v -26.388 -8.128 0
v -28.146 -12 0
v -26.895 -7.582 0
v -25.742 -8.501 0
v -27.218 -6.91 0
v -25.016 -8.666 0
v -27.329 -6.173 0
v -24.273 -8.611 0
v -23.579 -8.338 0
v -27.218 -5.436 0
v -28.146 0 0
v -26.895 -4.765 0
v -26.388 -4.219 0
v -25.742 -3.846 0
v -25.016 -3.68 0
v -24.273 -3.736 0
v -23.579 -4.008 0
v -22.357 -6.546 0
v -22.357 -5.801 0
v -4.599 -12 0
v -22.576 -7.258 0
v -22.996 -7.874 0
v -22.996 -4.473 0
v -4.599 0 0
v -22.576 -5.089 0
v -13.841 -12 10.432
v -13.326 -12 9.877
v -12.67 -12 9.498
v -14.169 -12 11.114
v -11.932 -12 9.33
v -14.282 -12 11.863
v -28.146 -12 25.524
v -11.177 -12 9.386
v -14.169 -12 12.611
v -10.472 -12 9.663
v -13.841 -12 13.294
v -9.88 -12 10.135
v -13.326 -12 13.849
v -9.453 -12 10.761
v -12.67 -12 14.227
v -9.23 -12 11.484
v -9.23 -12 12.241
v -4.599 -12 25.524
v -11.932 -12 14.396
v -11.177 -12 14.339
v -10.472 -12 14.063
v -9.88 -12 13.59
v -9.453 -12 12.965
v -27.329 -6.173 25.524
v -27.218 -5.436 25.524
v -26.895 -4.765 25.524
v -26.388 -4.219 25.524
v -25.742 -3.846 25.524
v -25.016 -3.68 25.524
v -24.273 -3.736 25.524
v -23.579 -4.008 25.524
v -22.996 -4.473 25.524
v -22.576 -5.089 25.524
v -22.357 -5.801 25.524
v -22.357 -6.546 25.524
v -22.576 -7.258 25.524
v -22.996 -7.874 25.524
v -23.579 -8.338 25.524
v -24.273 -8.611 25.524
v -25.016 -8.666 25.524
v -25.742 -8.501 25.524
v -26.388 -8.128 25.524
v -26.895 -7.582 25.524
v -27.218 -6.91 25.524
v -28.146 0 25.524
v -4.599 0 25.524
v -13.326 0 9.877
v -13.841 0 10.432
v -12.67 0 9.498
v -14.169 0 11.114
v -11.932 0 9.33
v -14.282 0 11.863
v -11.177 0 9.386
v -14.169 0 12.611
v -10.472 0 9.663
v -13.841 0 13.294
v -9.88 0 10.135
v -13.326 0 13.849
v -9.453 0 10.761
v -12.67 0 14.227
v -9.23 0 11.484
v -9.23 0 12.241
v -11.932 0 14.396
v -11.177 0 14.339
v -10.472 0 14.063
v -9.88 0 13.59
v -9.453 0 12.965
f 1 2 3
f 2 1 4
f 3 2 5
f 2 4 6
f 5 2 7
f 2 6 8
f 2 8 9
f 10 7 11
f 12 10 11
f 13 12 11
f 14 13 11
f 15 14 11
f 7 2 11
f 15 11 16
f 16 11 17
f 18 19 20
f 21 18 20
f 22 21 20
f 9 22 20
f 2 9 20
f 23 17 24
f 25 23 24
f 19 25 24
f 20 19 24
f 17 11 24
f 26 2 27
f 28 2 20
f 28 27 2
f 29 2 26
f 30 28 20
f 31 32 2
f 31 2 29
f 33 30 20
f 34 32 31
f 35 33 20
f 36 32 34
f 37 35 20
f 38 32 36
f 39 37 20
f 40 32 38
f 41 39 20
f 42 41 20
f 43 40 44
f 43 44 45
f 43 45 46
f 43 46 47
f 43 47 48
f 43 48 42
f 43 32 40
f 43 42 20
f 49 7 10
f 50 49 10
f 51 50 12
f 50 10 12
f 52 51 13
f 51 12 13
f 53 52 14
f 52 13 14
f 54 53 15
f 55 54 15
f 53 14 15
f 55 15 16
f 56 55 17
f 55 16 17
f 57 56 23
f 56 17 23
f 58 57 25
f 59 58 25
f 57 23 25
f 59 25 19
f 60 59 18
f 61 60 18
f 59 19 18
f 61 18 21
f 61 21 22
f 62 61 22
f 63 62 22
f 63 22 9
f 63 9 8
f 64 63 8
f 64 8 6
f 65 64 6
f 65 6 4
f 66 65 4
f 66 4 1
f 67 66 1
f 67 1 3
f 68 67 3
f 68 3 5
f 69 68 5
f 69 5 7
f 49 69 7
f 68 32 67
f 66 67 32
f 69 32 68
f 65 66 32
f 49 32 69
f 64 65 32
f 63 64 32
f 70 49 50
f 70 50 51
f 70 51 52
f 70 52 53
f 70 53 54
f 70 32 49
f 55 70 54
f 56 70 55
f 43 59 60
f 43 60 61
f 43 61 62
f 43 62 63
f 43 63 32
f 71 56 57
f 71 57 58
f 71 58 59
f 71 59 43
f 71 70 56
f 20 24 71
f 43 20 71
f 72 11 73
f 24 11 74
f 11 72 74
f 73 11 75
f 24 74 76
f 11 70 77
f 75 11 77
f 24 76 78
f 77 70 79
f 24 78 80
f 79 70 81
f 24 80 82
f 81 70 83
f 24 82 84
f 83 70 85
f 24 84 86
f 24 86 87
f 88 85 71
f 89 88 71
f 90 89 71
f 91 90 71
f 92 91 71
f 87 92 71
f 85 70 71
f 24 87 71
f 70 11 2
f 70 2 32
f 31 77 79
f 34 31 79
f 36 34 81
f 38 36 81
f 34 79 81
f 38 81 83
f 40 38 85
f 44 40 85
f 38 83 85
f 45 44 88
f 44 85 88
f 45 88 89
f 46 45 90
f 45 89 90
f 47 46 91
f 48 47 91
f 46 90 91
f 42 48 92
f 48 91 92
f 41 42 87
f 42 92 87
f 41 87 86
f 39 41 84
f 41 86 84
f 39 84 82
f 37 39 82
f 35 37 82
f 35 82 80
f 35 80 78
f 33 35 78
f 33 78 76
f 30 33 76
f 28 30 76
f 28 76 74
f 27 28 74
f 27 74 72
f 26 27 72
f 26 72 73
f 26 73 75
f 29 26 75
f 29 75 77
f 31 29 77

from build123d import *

# Parameters (mm, degrees)
F0_W     = 23.546827
F0_H     = 25.524346
F1_DEPTH = 12
F3_D     = 5
F6_D     = 5.08


with BuildPart() as f1:
    # F0 (on Front) → F1 (new body)
    with BuildSketch(Plane.XZ):
        with Locations((-16.37222, 12.762173)):
            Rectangle(F0_W, F0_H)
    extrude(amount=F1_DEPTH)

    # F3 (through all)
    with Locations(Plane.XY.offset(25.524346)):
        with Locations((-24.82892, -6.173369)):
            Hole(F3_D / 2)

    # F6 (through all)
    with Locations(Plane.XZ.offset(12)):
        with Locations((-11.741878, 11.862813)):
            Hole(F6_D / 2)


solid = f1.part
